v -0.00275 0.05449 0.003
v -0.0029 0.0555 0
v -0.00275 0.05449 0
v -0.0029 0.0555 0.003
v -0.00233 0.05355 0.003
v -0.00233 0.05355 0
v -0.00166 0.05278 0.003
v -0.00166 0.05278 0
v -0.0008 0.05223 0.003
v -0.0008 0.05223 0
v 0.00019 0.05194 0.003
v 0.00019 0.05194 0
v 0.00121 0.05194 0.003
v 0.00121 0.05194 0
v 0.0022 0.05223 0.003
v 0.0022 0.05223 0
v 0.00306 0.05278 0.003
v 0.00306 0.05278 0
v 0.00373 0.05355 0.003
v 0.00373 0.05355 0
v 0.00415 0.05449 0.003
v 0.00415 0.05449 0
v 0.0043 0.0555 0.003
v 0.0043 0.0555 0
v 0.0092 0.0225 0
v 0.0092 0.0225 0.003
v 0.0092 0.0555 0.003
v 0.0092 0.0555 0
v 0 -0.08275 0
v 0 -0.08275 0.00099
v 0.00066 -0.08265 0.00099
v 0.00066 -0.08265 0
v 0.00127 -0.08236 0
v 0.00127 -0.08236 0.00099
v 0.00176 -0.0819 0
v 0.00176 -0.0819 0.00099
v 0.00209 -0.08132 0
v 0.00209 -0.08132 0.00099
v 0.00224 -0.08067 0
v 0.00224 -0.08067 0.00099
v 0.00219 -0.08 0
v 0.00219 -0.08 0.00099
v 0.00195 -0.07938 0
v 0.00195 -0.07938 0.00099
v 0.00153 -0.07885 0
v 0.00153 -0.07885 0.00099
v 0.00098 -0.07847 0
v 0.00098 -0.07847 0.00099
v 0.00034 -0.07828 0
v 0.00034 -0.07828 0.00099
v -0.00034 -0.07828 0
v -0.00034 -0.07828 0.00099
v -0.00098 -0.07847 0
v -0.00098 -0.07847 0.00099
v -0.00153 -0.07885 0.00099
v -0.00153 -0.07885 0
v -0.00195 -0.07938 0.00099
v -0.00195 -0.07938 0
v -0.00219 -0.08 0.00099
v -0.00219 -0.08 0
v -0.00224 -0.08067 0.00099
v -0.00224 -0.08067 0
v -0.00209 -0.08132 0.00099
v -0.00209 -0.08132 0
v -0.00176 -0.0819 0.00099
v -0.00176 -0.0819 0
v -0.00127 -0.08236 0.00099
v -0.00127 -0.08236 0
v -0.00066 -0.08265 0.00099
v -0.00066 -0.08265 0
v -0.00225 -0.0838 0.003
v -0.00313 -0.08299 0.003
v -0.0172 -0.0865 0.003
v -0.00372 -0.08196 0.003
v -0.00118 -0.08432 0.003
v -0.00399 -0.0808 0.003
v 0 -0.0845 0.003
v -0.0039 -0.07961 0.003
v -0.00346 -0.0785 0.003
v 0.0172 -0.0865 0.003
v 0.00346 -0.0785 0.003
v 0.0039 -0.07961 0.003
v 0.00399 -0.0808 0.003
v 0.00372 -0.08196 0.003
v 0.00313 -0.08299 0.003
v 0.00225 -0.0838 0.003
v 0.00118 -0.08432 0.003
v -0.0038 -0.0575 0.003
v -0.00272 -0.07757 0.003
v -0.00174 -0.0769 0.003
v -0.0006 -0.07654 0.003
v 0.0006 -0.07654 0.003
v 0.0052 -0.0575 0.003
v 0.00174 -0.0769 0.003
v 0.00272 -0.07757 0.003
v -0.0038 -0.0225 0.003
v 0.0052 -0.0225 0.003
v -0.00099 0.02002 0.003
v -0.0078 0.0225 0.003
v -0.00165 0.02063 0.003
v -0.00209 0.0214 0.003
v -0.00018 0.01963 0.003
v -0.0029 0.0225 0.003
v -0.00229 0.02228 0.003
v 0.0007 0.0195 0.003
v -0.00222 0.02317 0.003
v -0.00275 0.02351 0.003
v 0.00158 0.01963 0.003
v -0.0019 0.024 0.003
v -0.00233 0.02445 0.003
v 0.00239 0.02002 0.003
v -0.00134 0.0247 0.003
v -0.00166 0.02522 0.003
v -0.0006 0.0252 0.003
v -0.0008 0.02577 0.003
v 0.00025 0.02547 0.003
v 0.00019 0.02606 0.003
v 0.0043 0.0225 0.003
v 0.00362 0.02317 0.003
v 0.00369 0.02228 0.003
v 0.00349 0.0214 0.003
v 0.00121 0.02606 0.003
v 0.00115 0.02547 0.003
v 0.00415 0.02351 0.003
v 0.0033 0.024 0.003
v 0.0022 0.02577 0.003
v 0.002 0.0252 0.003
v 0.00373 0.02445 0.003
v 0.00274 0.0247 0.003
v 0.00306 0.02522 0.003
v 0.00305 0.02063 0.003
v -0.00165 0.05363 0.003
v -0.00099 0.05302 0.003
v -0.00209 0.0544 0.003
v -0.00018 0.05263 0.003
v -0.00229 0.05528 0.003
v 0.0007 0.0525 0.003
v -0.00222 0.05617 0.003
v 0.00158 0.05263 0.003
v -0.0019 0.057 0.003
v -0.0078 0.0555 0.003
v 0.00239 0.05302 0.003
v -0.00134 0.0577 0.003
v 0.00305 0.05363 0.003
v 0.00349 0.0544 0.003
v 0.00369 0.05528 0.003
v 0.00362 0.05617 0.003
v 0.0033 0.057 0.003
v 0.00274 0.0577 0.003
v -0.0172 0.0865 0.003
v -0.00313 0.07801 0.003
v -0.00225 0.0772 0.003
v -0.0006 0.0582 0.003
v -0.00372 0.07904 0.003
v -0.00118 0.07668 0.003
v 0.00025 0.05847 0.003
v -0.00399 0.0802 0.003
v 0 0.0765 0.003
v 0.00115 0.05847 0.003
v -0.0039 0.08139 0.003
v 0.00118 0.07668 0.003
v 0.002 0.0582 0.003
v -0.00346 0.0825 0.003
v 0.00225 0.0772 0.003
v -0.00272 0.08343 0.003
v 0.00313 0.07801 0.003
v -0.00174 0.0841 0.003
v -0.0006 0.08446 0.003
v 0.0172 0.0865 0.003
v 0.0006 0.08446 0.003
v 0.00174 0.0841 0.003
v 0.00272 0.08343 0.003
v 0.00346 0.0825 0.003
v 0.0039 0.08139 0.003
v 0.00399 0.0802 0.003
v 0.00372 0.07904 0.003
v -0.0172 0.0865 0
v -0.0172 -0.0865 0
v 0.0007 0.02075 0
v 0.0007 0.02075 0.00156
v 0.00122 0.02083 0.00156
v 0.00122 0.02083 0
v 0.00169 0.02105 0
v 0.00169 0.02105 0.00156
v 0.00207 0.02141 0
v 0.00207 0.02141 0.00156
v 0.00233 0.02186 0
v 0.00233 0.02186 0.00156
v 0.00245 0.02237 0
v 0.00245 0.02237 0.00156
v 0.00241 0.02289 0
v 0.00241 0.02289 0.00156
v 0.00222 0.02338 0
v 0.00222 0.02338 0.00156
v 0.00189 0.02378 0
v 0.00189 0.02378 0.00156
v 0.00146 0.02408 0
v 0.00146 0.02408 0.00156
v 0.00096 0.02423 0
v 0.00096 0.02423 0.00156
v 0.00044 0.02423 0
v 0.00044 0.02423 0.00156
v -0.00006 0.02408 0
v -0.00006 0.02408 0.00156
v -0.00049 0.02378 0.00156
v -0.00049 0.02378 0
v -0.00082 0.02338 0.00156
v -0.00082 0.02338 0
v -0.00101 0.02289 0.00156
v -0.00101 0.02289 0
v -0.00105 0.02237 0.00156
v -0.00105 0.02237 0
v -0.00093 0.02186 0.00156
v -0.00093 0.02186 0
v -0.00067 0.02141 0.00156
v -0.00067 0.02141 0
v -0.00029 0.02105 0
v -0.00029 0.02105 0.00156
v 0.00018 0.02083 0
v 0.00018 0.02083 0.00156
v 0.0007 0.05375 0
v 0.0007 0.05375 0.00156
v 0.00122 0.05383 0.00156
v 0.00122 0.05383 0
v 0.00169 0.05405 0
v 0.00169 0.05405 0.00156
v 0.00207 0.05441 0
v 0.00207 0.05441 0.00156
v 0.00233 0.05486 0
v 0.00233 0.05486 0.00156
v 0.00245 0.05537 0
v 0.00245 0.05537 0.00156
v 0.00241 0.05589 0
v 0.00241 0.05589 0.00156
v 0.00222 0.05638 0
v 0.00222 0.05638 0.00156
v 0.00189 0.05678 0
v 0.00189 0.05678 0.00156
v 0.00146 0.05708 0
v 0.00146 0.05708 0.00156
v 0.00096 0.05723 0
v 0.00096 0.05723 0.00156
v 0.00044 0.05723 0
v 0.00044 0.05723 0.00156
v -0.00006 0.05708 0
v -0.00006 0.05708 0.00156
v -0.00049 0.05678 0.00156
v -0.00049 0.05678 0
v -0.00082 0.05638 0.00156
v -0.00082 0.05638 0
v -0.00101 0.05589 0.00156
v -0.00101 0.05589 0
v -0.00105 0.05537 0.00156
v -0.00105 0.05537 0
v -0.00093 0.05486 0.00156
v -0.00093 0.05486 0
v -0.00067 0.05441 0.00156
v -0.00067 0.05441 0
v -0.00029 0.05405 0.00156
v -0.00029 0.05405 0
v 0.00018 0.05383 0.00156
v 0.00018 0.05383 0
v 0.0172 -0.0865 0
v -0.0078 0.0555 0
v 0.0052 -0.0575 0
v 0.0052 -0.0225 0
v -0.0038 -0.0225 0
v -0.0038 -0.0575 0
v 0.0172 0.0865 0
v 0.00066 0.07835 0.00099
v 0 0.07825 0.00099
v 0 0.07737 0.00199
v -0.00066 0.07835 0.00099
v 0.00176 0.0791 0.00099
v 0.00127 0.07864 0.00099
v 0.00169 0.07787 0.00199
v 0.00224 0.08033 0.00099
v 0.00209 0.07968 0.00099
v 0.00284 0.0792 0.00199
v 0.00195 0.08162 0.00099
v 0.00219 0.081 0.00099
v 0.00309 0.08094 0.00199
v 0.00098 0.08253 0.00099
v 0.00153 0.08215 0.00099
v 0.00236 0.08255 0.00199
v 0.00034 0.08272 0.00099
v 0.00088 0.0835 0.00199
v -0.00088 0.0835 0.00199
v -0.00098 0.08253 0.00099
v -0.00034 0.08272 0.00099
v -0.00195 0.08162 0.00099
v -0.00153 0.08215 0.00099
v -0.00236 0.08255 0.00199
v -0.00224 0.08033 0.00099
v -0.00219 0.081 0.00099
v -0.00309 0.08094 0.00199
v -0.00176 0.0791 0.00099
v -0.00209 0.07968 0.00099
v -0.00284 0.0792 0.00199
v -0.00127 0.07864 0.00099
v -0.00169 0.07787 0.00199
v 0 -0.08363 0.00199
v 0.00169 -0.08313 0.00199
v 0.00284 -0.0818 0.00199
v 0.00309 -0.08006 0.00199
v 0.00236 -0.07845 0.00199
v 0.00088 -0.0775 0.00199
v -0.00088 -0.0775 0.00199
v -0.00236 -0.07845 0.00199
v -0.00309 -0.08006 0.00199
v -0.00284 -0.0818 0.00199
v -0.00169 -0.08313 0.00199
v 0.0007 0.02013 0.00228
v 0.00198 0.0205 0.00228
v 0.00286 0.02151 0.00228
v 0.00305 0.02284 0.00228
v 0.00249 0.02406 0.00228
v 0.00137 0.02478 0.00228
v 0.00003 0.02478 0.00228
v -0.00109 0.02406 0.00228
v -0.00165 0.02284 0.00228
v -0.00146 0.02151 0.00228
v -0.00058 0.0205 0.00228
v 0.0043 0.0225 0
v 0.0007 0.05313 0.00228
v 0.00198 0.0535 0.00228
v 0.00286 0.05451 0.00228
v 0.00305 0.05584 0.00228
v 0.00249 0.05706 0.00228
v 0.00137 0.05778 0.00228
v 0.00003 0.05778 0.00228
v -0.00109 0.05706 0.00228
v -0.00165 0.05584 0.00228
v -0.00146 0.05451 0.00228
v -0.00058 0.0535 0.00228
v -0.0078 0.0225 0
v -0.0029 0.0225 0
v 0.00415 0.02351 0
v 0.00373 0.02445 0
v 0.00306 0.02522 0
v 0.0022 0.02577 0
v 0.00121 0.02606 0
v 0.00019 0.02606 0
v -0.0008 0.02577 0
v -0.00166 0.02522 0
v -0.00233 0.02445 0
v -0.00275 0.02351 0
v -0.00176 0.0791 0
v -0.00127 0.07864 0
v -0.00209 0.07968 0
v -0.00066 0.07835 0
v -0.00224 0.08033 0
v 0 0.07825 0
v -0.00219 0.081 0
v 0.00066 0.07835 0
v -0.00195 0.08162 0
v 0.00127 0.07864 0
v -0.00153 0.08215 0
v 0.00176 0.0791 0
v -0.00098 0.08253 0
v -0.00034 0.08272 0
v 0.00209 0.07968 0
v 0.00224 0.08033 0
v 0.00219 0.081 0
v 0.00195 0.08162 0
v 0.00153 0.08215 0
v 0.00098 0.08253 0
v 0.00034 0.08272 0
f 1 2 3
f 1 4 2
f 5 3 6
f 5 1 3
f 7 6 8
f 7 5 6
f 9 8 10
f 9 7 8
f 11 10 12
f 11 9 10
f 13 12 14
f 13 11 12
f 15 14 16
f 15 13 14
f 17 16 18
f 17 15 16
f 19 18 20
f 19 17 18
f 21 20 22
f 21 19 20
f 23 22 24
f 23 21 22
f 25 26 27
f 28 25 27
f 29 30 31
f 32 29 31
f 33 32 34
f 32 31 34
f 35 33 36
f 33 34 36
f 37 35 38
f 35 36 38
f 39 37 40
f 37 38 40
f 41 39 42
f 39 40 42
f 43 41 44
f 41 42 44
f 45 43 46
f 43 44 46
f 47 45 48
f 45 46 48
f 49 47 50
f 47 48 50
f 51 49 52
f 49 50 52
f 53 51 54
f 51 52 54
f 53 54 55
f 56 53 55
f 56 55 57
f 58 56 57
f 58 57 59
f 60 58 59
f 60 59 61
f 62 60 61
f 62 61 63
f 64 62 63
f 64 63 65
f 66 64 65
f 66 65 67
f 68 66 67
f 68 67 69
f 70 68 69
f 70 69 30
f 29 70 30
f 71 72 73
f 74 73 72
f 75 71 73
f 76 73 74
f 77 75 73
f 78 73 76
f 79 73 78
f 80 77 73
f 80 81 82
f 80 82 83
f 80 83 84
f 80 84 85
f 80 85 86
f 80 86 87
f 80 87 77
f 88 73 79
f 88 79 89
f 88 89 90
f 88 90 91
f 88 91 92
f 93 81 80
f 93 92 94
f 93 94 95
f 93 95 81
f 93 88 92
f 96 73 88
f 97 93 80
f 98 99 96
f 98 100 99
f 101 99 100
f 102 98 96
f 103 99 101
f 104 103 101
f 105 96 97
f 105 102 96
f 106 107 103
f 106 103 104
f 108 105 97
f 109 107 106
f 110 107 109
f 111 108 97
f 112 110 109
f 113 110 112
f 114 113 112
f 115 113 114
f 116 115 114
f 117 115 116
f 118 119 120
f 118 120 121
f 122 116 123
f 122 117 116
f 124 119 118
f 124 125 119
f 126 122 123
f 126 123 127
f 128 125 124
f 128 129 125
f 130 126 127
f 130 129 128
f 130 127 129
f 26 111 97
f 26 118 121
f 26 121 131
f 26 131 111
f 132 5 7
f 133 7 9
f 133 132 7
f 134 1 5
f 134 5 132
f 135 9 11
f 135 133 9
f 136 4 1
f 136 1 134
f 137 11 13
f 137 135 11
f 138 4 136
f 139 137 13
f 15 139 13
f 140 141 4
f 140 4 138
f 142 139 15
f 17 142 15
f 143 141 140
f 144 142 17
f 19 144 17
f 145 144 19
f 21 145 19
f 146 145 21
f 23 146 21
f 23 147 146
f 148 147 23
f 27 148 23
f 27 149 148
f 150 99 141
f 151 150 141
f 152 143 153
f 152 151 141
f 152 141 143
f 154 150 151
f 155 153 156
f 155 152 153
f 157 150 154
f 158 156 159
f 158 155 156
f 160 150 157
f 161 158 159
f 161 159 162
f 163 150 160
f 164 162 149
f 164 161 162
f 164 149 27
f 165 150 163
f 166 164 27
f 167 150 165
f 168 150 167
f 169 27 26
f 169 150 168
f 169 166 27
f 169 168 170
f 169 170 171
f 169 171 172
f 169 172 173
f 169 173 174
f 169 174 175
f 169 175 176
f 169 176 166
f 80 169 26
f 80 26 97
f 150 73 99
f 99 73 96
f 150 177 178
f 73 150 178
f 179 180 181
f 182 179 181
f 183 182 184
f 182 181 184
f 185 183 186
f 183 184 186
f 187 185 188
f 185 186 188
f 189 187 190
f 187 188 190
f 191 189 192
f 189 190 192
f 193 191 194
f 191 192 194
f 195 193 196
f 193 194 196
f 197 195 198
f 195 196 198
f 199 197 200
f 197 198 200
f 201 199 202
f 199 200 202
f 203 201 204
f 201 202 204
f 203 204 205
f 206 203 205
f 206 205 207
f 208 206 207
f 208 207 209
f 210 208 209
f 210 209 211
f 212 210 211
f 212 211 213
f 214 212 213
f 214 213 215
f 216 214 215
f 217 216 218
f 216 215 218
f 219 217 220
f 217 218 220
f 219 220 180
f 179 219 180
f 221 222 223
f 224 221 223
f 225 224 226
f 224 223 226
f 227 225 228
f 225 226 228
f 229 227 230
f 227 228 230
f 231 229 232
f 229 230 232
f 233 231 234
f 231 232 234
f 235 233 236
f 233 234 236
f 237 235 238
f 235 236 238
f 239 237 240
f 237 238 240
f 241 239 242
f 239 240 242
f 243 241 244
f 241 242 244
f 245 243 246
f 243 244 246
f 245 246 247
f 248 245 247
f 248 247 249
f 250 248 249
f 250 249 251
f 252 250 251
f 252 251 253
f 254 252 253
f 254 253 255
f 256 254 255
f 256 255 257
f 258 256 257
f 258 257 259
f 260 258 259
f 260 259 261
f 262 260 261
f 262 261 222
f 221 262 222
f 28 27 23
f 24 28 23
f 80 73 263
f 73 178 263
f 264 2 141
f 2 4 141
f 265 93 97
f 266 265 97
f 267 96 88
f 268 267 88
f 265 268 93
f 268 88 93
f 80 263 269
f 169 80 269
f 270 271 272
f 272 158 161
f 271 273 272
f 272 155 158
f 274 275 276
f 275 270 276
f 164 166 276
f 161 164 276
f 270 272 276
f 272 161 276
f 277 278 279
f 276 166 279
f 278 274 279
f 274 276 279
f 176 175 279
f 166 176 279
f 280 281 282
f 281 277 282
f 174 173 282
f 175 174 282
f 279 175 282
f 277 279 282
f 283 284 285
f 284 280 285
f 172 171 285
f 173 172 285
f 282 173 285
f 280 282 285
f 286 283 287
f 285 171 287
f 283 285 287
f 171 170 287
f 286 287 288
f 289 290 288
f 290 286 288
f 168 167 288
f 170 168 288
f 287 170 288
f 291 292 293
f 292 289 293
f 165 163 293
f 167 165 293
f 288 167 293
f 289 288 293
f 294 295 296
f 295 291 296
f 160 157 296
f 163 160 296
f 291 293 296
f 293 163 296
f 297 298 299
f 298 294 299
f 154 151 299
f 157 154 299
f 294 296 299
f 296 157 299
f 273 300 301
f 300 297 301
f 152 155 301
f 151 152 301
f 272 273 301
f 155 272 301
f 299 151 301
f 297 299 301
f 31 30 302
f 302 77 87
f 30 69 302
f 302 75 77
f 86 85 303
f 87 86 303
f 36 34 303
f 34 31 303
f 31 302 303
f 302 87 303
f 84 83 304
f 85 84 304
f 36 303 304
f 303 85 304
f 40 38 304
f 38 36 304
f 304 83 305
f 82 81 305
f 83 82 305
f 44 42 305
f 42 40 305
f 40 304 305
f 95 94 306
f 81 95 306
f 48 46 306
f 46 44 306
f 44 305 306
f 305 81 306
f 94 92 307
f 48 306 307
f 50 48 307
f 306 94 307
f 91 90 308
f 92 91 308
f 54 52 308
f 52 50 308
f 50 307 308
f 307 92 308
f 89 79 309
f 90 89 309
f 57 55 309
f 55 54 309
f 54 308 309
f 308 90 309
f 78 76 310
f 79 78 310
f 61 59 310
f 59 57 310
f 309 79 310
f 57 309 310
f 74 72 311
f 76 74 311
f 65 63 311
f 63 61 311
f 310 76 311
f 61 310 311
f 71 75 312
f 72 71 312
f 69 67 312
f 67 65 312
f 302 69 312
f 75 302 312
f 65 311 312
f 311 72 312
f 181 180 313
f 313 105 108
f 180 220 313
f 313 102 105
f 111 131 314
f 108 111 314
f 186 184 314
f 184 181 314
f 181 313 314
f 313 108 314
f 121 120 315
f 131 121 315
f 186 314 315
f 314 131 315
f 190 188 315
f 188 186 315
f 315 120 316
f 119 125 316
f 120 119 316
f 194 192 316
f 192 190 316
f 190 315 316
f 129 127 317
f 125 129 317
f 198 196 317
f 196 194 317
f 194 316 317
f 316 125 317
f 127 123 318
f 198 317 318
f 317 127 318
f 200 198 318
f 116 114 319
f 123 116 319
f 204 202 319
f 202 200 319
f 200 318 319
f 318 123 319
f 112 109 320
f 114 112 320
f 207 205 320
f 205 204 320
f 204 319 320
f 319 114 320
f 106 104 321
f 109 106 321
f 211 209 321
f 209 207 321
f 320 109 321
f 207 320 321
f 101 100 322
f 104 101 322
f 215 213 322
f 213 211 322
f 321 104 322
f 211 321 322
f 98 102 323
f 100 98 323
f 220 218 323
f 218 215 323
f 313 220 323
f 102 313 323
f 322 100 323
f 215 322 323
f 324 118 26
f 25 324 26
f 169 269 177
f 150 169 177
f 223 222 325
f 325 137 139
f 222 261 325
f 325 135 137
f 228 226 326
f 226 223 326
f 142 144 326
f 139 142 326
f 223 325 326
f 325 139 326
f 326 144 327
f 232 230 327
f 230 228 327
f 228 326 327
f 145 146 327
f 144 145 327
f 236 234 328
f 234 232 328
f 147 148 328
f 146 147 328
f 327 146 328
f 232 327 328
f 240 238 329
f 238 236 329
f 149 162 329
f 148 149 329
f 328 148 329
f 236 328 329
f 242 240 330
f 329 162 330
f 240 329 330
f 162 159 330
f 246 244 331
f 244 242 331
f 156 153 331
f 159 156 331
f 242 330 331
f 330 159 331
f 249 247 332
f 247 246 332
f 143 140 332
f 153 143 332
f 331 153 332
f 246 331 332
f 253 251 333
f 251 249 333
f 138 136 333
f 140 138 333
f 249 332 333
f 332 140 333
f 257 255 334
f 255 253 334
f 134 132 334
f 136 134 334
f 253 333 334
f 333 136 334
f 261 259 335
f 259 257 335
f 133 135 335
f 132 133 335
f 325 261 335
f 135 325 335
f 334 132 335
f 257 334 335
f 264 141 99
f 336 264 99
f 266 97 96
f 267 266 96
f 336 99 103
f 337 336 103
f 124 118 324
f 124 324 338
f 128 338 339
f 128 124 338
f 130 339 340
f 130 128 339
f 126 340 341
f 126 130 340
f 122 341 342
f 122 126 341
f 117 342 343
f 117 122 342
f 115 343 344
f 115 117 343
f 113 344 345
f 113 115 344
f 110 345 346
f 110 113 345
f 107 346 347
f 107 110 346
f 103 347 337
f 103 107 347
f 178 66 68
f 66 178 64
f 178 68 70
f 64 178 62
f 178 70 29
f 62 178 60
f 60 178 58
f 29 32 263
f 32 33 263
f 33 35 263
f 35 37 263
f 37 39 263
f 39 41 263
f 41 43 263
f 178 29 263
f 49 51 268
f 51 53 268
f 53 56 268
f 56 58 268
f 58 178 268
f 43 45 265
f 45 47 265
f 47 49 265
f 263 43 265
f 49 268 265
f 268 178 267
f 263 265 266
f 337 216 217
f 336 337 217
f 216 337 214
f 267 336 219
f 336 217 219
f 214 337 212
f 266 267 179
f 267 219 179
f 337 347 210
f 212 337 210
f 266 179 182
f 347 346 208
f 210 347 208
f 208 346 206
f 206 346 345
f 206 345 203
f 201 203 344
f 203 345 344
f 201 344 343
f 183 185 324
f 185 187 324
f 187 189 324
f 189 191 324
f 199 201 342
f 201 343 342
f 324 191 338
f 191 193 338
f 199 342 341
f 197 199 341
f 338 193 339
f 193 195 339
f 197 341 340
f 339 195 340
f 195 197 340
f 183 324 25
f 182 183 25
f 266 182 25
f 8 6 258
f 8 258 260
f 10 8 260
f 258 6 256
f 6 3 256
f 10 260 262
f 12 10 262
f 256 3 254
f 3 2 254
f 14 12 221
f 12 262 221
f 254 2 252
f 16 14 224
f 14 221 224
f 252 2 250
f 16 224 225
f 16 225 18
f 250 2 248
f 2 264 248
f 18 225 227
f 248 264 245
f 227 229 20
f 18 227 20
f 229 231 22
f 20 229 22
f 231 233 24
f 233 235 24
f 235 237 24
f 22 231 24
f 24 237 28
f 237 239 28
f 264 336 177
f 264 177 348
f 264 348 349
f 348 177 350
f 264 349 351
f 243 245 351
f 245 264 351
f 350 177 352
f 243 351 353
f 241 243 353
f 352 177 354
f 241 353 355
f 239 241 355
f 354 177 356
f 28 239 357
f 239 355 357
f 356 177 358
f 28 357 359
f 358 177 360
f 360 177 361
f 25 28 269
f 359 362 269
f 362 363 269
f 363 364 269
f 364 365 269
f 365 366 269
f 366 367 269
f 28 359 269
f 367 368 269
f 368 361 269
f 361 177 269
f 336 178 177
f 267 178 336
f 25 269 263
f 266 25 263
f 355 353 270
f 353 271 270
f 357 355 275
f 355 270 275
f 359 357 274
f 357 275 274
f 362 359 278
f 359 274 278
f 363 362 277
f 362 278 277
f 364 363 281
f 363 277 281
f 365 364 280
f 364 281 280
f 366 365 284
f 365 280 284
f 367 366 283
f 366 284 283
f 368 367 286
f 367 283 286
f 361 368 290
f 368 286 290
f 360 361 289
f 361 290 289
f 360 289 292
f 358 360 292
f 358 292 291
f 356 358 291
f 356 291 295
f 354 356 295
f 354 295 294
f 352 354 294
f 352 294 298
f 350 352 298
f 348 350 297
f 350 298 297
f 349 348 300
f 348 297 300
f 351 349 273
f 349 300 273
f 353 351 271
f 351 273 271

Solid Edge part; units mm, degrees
sketch "Sketch1" plane through (0, 0, 0) normal (0, 0, 1) x (1, 0, 0)
  line L0 (-0.0172, -0.0865) -> (0.0172, -0.0865)
  line L1 (0.0172, -0.0865) -> (0.0172, 0.0865)
  line L2 (0.0172, 0.0865) -> (-0.0172, 0.0865)
  line L3 (-0.0172, 0.0865) -> (-0.0172, -0.0865)
  dimension "D1" = 0.0344
  dimension "D2" = 0.173
extrude "Protrusion1" add sketch "Sketch1" along normal blind 0.003
sketch "Sketch2" plane through (0, 0, 0.003) normal (0, 0, 1) x (0, 1, 0)
  line L0 (0.0225, -0.0092) -> (0.0555, -0.0092)
  line L1 (0.0555, -0.0092) -> (0.0555, -0.0043)
  line L2 (0.0555, 0.0029) -> (0.0555, 0.0078)
  line L3 (0.0555, 0.0078) -> (0.0225, 0.0078)
  line L4 (0.0225, 0.0078) -> (0.0225, 0.0029)
  line L5 (0.0225, -0.0043) -> (0.0225, -0.0092)
  arc A0 (0.0225, 0.0029) -> (0.0225, -0.0043) centre (0.0225, -0.0007) cw
  arc A1 (0.0555, -0.0043) -> (0.0555, 0.0029) centre (0.0555, -0.0007) cw
  line L6 (-0.0575, -0.0052) -> (-0.0225, -0.0052)
  line L7 (-0.0225, -0.0052) -> (-0.0225, 0.0038)
  line L8 (-0.0225, 0.0038) -> (-0.0575, 0.0038)
  line L9 (-0.0575, 0.0038) -> (-0.0575, -0.0052)
  dimension "D1" = 0.0575
  dimension "D2" = 0.0555
  dimension "D3" = 0.0225
extrude "Cutout1" cut sketch "Sketch2" against normal through all
hole "Bohrung_1" at (0, 0.0805, 0.003) direction (0, 0, -1) diameter 0.0045 end through all countersink diameter 0.008 countersink angle 82
hole "Hole1" at (0, -0.0805, 0.003) direction (0, 0, -1) diameter 0.0045 end through all countersink diameter 0.008 countersink angle 82
hole "Bohrung_3" at (0.0007, 0.0225, 0.003) direction (0, 0, -1) diameter 0.0035 end through all countersink diameter 0.006 countersink angle 82
hole "Hole2" at (0.0007, 0.0555, 0.003) direction (0, 0, -1) diameter 0.0035 end through all countersink diameter 0.006 countersink angle 82
